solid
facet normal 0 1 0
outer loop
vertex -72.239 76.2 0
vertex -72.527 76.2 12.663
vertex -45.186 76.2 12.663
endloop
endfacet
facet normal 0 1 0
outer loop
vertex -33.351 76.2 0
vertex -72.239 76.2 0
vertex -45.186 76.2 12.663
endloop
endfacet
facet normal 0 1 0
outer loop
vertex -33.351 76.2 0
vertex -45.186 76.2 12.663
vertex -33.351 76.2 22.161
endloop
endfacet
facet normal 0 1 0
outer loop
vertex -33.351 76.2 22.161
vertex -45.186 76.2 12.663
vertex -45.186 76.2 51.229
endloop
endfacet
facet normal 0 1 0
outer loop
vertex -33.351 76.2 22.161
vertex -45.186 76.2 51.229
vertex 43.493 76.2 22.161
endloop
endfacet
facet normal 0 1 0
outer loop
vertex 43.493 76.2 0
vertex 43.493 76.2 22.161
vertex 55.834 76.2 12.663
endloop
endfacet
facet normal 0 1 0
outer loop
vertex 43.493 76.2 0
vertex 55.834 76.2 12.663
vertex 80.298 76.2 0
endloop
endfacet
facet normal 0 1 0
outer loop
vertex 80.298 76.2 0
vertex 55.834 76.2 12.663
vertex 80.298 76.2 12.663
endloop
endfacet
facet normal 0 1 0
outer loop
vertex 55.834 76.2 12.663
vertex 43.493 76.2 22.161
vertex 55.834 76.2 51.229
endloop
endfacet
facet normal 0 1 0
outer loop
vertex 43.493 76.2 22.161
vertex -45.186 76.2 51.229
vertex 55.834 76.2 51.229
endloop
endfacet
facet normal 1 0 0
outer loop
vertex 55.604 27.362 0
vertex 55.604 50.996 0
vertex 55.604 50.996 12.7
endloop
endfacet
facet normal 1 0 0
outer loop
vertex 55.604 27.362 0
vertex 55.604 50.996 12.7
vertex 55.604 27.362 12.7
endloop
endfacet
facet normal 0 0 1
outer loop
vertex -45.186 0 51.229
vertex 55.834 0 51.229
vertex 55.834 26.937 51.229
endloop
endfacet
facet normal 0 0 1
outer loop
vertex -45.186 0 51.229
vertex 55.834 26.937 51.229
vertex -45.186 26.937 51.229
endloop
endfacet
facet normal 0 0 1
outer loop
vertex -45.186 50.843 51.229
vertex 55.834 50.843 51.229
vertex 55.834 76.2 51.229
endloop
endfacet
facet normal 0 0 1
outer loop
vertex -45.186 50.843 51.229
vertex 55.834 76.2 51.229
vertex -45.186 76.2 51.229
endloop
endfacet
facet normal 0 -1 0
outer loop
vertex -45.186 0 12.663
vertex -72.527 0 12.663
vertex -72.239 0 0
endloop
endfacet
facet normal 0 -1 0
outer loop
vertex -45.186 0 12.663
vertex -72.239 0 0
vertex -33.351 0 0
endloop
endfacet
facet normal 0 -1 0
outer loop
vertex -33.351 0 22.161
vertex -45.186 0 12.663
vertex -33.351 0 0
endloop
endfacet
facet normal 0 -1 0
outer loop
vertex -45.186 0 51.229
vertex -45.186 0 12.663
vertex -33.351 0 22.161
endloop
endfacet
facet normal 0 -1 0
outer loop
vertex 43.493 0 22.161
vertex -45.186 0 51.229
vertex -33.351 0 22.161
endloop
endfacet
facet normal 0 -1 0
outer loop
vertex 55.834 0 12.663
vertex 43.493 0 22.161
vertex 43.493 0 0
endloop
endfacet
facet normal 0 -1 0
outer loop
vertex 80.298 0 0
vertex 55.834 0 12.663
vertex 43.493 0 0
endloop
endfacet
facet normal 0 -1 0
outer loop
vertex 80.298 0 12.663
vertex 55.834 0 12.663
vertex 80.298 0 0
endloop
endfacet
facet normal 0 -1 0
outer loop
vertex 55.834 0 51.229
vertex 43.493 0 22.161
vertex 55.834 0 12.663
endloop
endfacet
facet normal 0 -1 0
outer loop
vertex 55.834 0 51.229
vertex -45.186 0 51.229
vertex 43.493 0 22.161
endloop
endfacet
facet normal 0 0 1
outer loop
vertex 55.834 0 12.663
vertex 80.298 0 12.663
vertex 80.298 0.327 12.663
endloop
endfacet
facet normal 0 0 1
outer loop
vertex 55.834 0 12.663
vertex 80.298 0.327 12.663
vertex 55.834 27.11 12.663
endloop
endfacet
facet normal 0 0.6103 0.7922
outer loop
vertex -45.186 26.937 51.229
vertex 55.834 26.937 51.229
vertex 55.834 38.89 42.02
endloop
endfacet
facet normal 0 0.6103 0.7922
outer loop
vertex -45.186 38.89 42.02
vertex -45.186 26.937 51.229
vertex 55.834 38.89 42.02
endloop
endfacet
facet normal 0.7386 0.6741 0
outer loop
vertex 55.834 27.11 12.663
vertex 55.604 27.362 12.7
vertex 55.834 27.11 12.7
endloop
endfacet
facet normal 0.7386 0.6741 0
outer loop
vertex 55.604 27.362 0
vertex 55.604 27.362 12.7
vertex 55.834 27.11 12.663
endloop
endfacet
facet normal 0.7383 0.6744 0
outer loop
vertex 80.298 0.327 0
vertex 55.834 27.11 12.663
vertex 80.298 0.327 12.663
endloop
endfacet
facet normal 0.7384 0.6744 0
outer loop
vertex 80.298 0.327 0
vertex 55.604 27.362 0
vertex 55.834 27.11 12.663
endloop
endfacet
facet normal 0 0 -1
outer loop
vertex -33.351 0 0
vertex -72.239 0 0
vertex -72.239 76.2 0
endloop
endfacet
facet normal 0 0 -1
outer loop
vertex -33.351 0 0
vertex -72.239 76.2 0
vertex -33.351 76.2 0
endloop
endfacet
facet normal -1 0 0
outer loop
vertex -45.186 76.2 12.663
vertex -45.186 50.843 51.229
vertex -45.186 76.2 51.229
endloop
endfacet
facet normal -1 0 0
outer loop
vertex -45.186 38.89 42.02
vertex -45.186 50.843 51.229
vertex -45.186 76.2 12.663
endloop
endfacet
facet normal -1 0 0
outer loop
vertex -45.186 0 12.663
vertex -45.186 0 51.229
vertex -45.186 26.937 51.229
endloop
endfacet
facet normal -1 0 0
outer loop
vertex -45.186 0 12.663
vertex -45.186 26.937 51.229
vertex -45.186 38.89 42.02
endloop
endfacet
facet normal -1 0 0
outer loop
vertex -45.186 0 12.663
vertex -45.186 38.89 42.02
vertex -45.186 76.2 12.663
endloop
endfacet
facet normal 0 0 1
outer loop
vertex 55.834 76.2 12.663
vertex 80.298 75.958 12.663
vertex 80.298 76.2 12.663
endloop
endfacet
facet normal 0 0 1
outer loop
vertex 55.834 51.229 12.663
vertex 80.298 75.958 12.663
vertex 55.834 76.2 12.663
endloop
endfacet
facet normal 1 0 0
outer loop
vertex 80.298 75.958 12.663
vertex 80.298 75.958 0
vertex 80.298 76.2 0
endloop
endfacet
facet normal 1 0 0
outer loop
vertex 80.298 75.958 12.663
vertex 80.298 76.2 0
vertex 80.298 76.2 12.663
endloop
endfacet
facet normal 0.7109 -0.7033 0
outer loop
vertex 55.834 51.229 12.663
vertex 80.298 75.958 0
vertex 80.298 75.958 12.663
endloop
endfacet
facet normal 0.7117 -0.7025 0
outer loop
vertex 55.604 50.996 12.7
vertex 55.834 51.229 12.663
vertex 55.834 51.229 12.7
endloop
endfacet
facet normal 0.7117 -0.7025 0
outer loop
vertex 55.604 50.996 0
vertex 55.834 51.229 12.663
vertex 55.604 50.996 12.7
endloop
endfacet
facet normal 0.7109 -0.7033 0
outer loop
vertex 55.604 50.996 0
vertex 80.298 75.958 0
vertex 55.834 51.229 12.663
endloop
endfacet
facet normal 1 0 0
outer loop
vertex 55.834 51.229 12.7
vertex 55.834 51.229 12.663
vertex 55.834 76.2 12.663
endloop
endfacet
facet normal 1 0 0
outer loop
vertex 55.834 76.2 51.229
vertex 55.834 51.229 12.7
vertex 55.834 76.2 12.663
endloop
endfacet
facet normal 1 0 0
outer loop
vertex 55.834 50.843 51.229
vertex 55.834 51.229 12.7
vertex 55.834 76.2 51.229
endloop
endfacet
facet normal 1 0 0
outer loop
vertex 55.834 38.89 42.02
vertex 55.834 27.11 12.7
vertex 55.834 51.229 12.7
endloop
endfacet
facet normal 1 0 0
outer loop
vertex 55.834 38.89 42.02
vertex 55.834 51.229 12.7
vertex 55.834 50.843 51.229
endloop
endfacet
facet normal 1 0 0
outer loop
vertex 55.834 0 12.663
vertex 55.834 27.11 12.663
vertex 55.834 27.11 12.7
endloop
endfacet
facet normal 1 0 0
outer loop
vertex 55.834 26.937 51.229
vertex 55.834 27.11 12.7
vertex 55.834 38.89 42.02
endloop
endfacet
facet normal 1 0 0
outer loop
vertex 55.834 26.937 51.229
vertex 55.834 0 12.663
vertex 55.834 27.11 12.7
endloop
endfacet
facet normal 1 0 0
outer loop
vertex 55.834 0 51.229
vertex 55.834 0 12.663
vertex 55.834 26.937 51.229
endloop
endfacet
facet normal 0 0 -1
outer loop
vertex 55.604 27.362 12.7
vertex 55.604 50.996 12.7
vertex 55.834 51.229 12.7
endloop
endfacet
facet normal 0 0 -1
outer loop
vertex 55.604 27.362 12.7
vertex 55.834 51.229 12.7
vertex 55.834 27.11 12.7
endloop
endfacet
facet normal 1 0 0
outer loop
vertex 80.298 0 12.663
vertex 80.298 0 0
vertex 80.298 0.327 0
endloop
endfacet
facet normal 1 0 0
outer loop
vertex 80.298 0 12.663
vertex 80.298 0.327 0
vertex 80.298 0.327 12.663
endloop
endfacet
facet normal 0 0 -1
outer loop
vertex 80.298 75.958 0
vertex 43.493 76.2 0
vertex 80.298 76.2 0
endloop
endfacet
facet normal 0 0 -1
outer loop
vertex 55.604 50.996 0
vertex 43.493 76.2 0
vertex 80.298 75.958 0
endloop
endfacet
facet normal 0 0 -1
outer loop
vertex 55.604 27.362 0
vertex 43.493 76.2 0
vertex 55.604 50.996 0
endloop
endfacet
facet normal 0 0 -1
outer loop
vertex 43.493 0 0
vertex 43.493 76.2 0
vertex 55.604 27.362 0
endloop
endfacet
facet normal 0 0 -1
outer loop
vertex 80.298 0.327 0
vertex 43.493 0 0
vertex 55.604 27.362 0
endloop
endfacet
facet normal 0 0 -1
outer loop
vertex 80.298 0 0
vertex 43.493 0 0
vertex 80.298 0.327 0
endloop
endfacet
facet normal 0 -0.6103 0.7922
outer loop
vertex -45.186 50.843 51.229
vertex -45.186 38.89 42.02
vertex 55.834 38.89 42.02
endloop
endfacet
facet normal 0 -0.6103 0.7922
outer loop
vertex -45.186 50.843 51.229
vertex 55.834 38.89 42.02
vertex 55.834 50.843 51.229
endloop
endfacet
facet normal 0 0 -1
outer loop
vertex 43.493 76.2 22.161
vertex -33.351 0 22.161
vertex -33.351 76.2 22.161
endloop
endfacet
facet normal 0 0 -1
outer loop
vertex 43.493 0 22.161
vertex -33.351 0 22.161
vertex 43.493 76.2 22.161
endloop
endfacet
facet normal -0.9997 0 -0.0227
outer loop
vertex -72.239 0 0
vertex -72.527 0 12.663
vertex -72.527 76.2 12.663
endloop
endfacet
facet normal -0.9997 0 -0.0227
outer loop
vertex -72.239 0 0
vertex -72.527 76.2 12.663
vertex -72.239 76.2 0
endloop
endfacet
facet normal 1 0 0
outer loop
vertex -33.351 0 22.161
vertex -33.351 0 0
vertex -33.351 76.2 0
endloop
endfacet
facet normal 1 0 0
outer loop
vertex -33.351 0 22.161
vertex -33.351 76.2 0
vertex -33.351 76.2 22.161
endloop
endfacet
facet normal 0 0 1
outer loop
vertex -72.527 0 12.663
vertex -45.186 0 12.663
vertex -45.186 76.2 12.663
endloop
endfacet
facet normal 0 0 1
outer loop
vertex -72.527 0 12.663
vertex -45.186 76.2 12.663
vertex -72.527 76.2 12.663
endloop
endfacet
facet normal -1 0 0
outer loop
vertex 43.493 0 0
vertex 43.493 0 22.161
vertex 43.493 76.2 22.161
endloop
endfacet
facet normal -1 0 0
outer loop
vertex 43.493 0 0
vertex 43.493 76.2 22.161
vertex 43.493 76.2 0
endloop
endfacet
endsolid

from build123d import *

# Parameters (mm, degrees)
F1_DEPTH = 76.2
F3_DEPTH = 50.8
F4_DEPTH = 76.2
F6_DEPTH = 12.7


with BuildPart() as f1:
    # F0 (on Front) → F1 (new body)
    with BuildSketch(Plane.XZ):
        Polygon((-72.527050972, 12.6634538174), (-72.2392499447, 0), (-33.3512052894, 0), (-33.3512052894, 22.1610423177), (43.4929318726, 22.1610423177), (43.4929318726, 0), (80.2978053689, 0), (80.2978053689, 12.6634538174), (55.8343157172, 12.6634538174), (55.8343157172, 51.2294247746), (-45.1855063438, 51.2294247746), (-45.1855063438, 12.6634538174), align=None)
    extrude(amount=-F1_DEPTH)

    # F2 (on Right) → F3 (cut)
    with BuildSketch(Plane.YZ):
        Polygon((51.5903218925, 51.8050380051), (38.8903218925, 51.8050380051), (26.1903218925, 51.8050380051), (38.8903218925, 42.0196428895), align=None)
    extrude(amount=-F3_DEPTH, mode=Mode.SUBTRACT)

    # F4 (cut): a face of the model
    f4_faces = [f1.faces().sort_by_distance(p)[0] for p in [
        (0, 38.8903218925, 48.1594974796),
    ]]
    extrude(f4_faces, amount=-F4_DEPTH, mode=Mode.SUBTRACT)

    # F5 (on Top) → F6 (cut)
    with BuildSketch(Plane.XY):
        Polygon((55.6040368974, 27.3620393127), (80.5960595608, 0), (80.5960595608, 76.2594789267), (55.6040368974, 50.9958043694), align=None)
    extrude(amount=F6_DEPTH, mode=Mode.SUBTRACT)


solid = f1.part
